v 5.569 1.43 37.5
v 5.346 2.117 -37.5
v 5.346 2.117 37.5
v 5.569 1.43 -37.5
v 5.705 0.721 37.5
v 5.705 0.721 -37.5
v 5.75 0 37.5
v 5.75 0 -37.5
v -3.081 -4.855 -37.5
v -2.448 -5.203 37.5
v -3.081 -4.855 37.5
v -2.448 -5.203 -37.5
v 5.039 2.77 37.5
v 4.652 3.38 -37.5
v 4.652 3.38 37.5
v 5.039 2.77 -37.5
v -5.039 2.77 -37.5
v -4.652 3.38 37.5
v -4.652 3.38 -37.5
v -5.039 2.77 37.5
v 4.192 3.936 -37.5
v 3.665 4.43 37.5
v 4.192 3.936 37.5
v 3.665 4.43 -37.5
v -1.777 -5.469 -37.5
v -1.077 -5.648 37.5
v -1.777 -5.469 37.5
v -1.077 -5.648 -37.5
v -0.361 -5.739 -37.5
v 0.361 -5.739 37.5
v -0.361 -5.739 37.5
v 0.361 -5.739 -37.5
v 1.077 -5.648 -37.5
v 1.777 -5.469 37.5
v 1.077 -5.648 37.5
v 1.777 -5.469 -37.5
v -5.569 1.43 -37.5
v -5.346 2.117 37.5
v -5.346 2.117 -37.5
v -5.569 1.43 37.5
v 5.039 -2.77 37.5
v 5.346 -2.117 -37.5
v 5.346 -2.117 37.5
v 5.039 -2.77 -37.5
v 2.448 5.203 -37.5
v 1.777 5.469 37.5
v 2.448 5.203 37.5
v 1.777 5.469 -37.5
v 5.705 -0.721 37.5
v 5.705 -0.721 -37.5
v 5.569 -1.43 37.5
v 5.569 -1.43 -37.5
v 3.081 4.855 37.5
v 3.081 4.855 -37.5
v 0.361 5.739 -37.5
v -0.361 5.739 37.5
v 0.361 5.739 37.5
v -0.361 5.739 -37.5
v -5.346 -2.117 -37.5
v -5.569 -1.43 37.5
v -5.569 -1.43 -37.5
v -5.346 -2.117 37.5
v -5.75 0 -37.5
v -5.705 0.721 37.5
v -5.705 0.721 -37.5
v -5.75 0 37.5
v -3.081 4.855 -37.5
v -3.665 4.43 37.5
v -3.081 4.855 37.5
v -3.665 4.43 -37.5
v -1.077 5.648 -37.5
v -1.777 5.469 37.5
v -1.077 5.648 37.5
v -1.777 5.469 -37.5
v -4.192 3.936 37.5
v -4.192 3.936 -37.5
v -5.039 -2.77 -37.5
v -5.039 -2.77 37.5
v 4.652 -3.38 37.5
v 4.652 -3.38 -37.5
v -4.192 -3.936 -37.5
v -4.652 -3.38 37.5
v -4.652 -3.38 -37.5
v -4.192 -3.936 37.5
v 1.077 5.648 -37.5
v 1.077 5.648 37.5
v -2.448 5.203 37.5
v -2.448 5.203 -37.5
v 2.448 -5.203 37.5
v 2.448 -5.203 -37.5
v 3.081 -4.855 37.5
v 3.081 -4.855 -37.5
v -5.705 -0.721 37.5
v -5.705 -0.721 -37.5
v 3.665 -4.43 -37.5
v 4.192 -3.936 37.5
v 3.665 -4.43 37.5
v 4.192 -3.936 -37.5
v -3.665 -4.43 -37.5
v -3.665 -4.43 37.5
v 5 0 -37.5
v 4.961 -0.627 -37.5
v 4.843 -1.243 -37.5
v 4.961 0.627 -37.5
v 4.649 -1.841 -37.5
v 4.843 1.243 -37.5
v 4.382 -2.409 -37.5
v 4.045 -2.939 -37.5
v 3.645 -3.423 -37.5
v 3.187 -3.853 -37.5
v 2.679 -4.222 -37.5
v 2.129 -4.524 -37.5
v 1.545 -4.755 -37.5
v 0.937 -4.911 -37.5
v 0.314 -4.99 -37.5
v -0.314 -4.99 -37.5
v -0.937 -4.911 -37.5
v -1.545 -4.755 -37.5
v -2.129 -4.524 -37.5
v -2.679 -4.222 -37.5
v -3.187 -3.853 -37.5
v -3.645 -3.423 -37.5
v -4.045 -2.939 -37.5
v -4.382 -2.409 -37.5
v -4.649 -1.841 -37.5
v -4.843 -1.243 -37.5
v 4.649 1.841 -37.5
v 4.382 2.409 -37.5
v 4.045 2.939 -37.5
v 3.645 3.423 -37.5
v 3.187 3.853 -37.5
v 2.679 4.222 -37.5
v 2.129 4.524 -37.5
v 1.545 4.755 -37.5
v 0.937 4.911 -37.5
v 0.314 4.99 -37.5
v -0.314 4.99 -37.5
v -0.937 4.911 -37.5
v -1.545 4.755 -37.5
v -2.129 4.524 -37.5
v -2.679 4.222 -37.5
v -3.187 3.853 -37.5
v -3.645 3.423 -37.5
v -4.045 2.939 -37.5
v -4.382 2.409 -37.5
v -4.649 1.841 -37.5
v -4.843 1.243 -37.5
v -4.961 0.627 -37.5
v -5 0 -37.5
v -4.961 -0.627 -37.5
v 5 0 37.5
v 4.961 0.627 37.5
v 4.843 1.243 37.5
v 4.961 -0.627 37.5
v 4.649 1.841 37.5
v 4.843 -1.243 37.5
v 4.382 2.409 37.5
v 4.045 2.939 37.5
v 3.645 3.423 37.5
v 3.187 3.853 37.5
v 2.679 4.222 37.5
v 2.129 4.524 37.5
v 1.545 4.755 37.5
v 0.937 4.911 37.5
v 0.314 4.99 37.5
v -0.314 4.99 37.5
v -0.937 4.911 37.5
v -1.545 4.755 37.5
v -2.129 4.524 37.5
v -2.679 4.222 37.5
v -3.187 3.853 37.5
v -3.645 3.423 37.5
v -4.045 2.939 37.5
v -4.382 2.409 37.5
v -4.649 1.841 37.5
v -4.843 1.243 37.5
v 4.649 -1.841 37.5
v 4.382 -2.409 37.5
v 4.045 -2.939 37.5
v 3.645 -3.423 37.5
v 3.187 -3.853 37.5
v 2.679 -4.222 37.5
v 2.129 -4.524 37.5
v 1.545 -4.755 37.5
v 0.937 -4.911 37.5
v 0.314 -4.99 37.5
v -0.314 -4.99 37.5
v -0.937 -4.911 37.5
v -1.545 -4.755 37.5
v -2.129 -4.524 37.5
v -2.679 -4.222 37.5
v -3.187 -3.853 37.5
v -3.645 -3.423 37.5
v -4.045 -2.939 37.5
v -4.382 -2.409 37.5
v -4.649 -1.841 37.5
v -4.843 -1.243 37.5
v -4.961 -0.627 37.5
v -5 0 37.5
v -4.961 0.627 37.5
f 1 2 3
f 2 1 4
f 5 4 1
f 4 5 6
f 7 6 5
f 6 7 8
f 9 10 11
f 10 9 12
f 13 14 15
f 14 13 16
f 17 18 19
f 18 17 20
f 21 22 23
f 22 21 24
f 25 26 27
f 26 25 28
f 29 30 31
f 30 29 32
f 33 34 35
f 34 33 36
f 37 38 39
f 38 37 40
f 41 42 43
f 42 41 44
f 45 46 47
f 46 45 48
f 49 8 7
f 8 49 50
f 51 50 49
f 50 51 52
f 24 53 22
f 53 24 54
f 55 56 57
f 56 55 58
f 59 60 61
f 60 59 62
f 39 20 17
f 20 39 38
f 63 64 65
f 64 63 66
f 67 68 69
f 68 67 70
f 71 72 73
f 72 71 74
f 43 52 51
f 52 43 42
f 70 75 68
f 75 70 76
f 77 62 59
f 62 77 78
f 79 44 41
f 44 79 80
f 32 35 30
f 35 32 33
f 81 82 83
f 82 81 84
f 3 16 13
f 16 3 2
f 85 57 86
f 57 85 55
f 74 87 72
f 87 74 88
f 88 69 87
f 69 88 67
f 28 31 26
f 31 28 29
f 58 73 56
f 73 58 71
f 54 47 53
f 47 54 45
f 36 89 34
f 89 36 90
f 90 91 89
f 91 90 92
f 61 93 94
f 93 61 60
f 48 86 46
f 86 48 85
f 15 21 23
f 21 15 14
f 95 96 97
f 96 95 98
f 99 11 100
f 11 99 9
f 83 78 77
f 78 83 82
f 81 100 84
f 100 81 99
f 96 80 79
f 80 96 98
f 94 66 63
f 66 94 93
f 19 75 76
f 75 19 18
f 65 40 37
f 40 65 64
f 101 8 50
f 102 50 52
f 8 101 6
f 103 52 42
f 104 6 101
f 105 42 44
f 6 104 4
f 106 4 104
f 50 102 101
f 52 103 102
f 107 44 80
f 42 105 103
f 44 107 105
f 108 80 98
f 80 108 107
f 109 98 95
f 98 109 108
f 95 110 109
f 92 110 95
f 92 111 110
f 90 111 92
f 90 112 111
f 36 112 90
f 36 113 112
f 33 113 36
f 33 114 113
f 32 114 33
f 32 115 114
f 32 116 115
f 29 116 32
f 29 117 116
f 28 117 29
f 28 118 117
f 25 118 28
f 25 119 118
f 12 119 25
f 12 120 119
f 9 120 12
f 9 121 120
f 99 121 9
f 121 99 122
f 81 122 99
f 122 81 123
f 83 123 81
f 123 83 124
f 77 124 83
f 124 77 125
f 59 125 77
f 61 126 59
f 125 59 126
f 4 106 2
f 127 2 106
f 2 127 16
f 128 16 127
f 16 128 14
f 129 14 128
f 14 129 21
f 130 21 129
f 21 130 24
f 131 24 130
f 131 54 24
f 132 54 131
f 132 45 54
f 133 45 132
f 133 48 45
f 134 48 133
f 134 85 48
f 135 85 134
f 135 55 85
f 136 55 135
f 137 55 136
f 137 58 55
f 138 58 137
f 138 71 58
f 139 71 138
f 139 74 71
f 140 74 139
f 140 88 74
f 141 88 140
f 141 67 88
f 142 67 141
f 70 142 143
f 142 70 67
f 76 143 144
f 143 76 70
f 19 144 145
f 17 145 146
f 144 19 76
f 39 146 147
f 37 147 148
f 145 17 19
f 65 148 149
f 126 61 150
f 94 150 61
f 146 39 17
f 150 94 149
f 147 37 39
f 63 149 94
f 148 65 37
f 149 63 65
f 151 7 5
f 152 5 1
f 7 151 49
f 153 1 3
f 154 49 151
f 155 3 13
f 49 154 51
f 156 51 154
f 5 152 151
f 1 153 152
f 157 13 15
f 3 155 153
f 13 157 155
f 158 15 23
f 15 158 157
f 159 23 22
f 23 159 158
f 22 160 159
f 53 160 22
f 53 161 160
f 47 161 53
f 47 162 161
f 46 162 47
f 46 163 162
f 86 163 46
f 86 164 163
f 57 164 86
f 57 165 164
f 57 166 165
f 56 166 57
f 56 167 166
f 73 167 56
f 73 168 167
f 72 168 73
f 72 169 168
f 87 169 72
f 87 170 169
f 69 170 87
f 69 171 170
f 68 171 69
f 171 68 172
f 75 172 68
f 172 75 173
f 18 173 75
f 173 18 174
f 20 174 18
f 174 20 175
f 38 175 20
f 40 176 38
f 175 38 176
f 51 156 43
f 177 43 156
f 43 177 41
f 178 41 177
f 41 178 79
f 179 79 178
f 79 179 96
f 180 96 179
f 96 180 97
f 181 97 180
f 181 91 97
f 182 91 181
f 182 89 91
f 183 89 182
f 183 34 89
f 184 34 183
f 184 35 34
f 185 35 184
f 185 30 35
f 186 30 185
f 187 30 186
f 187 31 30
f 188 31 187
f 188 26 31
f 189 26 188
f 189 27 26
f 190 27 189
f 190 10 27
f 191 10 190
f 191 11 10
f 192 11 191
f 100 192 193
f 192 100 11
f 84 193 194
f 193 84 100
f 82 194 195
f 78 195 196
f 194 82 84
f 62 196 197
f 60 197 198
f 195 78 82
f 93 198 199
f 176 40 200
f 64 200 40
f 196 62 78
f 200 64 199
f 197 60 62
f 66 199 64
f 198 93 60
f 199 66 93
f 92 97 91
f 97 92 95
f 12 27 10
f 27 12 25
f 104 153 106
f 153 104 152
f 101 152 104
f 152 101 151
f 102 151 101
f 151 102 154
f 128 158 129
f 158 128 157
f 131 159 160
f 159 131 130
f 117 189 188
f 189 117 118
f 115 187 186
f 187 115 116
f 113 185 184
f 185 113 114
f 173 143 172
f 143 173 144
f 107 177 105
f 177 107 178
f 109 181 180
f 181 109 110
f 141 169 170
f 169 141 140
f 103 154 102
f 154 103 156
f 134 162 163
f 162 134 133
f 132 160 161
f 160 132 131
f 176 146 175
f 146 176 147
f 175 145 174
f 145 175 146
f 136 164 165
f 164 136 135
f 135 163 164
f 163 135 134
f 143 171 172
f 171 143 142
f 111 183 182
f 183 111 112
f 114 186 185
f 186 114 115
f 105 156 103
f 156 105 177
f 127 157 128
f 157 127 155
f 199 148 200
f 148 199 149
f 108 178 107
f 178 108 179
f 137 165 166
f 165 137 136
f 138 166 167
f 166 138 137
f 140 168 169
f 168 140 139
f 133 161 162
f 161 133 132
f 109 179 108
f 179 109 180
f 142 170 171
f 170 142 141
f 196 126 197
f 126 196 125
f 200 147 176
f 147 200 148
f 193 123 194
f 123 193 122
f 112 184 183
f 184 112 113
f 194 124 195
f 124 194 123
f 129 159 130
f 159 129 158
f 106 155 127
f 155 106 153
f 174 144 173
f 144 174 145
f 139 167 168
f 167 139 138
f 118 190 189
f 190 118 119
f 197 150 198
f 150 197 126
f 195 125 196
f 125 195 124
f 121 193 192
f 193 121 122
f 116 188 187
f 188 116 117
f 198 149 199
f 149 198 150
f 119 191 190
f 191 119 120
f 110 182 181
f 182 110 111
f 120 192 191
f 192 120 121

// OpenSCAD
$fn = 50;


difference() {
	union() {
		translate(v = [0, 0, -37.5000000000]) {
			cylinder(h = 75, r = 5.7500000000);
		}
	}
	union() {
		translate(v = [0, 0, -100.0000000000]) {
			cylinder(h = 200, r = 5.0000000000);
		}
	}
}
